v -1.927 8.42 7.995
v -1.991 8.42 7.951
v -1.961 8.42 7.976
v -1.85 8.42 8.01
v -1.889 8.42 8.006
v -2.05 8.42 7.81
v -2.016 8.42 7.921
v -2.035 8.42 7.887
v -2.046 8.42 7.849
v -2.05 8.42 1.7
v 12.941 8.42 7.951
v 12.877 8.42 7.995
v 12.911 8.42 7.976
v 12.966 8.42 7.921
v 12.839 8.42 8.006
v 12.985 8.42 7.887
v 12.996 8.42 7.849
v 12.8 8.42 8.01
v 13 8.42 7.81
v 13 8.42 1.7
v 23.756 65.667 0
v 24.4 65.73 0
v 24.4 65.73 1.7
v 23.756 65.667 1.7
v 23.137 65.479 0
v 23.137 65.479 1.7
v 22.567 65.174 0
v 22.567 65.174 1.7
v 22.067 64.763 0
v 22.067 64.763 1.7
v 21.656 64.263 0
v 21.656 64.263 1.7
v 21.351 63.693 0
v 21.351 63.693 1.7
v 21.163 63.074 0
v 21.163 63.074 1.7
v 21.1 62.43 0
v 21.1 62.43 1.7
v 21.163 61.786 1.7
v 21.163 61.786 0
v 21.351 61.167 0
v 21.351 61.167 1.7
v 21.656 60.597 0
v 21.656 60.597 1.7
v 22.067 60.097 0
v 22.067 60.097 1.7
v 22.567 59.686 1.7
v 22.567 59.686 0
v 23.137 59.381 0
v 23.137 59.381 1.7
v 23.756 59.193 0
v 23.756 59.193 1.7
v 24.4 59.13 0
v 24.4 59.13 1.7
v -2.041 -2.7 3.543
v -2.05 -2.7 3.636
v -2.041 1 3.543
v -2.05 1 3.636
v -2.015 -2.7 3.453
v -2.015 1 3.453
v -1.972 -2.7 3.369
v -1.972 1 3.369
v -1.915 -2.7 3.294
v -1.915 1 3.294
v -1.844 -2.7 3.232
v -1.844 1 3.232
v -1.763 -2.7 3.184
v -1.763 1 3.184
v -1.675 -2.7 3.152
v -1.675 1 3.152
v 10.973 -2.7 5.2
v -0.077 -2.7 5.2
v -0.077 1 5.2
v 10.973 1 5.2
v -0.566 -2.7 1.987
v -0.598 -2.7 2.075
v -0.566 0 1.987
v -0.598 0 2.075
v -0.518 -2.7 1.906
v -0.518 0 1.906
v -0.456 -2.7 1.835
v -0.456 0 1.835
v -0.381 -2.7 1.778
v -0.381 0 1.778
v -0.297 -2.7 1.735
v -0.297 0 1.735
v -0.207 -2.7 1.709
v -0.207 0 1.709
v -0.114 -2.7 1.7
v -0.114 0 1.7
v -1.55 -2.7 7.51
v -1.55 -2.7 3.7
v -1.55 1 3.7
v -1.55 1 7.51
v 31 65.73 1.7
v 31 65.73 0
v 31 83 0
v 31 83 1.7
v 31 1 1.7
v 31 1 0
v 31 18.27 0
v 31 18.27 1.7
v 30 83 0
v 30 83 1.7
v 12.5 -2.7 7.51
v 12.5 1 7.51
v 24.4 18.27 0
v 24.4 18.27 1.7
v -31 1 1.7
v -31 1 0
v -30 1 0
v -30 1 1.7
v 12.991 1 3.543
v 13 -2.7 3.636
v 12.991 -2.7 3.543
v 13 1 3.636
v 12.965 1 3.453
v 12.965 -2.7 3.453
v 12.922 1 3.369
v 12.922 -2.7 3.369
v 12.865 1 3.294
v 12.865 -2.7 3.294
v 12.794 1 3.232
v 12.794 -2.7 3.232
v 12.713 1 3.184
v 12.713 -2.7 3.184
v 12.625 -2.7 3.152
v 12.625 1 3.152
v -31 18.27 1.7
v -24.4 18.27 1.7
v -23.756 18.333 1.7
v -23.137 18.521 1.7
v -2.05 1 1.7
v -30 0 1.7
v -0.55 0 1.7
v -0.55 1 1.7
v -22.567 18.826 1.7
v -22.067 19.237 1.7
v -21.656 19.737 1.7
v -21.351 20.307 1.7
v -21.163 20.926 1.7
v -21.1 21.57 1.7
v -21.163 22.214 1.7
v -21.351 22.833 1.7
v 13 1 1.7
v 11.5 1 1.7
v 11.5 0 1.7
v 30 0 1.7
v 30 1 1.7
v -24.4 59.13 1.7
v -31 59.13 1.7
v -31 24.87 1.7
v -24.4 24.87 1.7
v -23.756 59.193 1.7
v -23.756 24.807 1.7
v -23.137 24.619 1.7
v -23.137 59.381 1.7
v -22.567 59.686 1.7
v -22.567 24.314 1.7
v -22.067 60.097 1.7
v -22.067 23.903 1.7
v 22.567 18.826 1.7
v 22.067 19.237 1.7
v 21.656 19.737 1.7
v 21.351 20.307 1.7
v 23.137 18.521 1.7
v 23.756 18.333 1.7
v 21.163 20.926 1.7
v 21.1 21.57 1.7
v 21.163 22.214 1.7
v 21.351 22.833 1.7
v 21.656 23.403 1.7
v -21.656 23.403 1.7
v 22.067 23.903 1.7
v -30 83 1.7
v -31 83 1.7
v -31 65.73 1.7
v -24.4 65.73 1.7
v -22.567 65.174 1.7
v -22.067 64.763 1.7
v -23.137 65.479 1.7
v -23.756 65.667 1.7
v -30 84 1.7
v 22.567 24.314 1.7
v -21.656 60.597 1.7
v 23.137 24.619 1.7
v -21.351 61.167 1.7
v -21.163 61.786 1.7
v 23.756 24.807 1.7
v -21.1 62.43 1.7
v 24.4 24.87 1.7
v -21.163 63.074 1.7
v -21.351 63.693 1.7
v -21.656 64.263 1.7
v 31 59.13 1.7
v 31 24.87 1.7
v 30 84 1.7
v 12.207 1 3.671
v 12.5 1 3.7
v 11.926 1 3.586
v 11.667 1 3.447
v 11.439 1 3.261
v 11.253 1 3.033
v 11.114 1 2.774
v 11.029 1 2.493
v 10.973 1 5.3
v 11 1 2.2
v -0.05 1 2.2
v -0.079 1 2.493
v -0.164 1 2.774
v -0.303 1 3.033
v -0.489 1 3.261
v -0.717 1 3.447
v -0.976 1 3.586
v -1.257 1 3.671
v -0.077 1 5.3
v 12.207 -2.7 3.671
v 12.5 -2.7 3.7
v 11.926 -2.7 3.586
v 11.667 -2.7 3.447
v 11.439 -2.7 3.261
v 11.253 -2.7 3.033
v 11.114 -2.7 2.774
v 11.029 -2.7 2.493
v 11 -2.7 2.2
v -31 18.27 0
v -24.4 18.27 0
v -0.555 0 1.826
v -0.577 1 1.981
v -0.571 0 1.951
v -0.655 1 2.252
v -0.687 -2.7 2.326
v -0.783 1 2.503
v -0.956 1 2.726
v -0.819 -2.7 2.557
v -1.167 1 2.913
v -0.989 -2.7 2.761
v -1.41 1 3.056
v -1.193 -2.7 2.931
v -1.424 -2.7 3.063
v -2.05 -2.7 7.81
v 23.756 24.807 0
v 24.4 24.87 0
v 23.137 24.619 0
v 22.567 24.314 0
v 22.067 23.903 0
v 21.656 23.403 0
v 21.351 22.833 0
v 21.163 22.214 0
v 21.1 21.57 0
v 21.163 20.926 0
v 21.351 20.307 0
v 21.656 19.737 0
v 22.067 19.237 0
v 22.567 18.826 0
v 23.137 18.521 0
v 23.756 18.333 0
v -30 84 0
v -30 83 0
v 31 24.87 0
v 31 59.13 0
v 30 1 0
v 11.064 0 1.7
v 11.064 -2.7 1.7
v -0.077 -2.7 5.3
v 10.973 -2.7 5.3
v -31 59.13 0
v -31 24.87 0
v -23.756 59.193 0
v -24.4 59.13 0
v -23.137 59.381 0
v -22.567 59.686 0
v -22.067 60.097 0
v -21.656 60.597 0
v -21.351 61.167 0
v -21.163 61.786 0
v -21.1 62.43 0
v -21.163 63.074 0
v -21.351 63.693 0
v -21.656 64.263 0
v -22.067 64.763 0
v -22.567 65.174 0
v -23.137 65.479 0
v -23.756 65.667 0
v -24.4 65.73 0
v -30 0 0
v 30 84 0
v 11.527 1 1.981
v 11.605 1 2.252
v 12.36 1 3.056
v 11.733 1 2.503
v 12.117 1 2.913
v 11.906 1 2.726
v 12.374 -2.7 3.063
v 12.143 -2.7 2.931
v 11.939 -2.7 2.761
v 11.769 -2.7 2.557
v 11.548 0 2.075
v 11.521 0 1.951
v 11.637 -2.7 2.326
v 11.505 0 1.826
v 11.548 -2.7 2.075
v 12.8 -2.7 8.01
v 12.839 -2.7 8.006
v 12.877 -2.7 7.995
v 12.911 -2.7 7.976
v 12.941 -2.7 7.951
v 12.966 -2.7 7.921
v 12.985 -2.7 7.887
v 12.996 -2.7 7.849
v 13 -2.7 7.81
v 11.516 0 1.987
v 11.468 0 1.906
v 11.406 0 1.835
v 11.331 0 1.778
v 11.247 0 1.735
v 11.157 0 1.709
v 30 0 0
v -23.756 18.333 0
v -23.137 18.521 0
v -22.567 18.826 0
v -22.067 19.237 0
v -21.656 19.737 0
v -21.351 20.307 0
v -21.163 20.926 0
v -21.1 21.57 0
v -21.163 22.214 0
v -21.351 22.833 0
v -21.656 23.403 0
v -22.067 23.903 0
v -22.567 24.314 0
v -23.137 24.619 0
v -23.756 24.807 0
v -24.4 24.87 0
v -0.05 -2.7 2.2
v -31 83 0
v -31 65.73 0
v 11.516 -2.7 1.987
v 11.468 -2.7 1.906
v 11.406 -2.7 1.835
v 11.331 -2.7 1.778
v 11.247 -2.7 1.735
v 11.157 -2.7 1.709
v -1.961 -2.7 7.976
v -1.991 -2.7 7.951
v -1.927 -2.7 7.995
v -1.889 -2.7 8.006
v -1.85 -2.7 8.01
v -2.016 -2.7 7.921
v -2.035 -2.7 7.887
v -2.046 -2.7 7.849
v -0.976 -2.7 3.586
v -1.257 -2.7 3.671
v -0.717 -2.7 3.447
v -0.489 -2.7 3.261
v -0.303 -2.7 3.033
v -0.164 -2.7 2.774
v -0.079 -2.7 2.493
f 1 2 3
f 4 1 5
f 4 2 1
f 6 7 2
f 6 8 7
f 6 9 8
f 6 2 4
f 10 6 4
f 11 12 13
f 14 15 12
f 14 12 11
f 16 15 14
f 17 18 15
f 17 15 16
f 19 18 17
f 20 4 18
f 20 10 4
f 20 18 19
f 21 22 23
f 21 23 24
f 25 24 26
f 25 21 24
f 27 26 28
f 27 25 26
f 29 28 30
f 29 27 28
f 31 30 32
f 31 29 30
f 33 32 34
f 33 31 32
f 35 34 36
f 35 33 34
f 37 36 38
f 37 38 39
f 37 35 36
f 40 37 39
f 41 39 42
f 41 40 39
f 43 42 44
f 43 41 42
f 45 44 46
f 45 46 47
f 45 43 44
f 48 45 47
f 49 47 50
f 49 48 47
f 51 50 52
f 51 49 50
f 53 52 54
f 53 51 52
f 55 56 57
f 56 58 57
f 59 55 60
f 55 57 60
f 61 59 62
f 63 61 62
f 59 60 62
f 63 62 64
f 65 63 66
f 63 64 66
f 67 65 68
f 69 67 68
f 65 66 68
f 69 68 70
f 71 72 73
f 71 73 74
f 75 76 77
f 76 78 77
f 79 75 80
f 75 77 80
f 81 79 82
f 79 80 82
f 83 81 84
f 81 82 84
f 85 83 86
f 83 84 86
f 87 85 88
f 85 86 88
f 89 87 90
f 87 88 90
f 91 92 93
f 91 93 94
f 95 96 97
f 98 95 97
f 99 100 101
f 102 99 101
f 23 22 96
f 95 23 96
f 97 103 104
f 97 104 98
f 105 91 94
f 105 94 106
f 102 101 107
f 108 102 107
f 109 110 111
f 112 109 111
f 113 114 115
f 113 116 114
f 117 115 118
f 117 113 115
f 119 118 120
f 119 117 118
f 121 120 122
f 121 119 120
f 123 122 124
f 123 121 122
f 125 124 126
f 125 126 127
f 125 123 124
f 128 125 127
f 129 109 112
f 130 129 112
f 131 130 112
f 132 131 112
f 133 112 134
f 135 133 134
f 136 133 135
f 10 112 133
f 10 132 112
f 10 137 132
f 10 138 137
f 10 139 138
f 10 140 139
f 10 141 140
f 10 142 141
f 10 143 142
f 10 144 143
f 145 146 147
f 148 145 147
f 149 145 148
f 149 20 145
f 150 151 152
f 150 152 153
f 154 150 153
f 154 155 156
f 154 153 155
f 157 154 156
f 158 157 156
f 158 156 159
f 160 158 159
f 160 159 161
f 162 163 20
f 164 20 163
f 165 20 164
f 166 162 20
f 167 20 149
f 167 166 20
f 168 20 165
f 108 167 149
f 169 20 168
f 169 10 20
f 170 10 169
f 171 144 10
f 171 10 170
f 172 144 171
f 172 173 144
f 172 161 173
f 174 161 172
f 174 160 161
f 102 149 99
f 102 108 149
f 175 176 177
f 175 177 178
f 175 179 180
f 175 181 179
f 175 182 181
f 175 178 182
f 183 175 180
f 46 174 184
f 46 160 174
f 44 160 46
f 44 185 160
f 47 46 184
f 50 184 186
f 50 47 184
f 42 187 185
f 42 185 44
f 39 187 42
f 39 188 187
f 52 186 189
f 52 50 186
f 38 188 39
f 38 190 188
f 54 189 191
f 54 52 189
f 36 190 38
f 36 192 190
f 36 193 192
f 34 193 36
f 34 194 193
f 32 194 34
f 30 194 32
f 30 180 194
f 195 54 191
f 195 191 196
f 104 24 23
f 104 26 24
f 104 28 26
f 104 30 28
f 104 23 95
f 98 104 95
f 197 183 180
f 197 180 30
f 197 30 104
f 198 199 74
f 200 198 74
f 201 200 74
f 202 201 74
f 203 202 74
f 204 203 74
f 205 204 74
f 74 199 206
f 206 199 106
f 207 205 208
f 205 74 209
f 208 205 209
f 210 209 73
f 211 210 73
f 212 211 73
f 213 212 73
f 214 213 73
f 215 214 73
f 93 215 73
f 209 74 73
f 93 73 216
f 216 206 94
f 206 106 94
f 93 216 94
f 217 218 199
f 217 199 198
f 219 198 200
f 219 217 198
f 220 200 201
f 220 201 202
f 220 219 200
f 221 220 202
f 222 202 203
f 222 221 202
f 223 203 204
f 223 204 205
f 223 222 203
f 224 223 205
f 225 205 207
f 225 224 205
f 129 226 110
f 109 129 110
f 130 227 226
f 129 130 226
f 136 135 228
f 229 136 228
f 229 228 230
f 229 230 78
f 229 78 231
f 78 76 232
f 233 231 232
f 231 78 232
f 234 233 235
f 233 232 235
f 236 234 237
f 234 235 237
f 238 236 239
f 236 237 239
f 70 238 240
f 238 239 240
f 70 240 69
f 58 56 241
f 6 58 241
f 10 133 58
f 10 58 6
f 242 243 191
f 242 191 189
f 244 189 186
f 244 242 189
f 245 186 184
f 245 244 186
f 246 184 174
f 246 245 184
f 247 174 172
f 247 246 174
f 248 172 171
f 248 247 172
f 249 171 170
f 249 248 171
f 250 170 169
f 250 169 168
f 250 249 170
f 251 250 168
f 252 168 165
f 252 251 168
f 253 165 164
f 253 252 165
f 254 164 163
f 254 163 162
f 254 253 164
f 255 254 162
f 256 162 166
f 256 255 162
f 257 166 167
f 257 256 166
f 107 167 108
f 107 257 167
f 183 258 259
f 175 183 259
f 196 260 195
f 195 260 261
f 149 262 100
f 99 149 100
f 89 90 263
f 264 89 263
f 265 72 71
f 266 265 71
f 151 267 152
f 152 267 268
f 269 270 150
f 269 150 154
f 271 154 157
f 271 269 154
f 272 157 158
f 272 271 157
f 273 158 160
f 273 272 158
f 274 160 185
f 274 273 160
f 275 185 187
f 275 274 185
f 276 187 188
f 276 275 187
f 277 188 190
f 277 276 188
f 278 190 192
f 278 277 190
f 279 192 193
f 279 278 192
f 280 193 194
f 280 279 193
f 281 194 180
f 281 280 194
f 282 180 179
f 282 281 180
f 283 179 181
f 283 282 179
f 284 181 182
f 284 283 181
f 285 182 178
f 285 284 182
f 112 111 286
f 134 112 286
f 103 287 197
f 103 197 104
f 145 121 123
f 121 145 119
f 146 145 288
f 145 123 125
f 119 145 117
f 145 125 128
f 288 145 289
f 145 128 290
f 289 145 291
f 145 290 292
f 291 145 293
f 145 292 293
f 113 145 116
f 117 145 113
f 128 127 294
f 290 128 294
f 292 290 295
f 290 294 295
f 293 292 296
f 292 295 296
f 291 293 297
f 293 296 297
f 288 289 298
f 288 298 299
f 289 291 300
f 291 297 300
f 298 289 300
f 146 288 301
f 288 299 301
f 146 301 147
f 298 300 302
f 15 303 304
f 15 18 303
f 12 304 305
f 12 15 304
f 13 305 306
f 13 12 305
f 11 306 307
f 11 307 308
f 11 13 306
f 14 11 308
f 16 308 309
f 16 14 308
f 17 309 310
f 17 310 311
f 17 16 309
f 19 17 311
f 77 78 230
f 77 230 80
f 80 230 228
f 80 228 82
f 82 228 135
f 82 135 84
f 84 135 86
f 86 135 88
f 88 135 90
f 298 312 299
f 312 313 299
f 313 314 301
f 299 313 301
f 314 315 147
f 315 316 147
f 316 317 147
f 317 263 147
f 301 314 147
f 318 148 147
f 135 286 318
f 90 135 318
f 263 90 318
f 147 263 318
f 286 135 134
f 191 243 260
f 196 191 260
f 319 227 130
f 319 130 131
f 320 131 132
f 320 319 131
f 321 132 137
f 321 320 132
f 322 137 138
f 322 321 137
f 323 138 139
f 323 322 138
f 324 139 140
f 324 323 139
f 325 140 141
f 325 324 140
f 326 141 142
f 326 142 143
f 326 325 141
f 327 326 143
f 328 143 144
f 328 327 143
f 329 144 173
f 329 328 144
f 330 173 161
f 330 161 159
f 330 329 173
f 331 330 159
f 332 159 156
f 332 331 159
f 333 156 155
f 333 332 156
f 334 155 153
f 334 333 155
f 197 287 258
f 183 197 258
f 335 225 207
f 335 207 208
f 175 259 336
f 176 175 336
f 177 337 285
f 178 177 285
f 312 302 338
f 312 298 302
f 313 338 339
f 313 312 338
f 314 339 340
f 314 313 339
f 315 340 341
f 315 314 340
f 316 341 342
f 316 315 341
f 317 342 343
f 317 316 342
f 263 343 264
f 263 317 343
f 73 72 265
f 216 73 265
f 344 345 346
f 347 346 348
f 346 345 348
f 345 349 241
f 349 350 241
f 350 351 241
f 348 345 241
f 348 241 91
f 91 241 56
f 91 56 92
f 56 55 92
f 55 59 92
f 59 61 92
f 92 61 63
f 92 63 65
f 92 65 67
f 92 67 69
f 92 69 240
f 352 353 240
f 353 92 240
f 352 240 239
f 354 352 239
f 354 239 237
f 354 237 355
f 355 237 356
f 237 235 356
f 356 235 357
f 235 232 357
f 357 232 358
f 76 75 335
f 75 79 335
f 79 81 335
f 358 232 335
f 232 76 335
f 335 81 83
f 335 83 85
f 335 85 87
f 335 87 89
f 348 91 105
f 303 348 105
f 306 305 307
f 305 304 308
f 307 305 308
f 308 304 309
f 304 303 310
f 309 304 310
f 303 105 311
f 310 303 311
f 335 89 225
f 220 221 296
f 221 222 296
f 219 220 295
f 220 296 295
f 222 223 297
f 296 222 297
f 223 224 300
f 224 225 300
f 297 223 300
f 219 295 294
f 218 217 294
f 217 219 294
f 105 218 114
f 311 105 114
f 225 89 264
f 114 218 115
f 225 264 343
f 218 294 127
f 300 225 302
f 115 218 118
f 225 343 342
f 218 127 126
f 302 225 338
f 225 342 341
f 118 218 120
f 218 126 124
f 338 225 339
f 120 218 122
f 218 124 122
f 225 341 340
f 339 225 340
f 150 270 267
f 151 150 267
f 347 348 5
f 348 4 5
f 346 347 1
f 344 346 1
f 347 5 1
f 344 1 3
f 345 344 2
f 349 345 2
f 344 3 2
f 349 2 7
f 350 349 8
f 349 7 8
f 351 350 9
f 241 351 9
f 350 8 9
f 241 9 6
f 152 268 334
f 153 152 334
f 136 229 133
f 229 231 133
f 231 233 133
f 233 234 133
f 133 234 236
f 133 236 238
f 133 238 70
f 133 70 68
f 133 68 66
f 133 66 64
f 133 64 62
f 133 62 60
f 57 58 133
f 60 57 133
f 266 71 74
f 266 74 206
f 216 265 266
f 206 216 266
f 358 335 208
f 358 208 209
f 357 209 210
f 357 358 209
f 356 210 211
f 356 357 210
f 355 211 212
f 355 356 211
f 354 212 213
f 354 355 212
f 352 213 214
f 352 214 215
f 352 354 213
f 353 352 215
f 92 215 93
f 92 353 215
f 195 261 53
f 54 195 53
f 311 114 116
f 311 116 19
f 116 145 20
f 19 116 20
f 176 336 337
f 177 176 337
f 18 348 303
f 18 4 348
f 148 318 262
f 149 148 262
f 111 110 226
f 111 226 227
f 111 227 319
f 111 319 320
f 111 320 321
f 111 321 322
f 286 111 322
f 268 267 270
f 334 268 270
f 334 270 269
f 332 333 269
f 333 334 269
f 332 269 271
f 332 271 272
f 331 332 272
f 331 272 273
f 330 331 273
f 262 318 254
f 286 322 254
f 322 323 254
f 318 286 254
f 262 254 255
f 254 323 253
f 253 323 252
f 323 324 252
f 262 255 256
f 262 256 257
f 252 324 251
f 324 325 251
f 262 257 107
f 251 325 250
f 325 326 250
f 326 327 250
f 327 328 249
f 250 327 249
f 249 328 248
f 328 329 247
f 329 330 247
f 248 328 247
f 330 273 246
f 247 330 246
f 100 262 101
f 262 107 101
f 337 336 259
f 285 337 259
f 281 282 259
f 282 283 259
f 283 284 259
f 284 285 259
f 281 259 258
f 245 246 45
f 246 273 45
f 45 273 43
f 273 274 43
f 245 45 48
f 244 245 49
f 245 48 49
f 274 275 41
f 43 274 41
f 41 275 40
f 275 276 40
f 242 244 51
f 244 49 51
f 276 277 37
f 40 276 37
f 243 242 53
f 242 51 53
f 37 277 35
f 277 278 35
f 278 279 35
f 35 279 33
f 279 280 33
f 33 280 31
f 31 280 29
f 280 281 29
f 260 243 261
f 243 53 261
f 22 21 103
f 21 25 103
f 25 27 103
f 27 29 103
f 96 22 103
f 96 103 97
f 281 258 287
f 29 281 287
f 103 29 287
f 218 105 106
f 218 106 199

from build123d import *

# Parameters (mm, degrees)
PAD_DEPTH       = 1.7
SKETCH006_W     = 15.05
SKETCH006_H     = 11.12
PAD005_DEPTH    = 6.31
SKETCH012_W     = 11.05
SKETCH012_H     = 0.1
POCKET001_DEPTH = 3.7
FILLET002_R     = 0.2
FILLET003_R     = 0.2
FILLET010_R     = 0.5


with BuildPart() as part:
    # Sketch → Pad (new body)
    with BuildSketch(Plane.XY):
        with BuildLine():
            Line((0, 0), (30, 0))
            Line((30, 0), (30, 1))
            Line((30, 1), (31, 1))
            Line((31, 1), (31, 18.27))
            Line((31, 18.27), (24.4, 18.27))
            ThreePointArc((24.4, 24.87), (21.1, 21.57), (24.4, 18.27))
            Line((24.4, 24.87), (31, 24.87))
            Line((31, 24.87), (31, 59.13))
            Line((31, 59.13), (24.4, 59.13))
            ThreePointArc((24.4, 65.73), (21.1, 62.43), (24.4, 59.13))
            Line((24.4, 65.73), (31, 65.73))
            Line((31, 65.73), (31, 83))
            Line((30, 83), (31, 83))
            Line((30, 84), (30, 83))
            Line((30, 84), (0, 84))
            Line((0, 84), (-30, 84))
            Line((-30, 84), (-30, 83))
            Line((-30, 83), (-31, 83))
            Line((-31, 83), (-31, 65.73))
            Line((-31, 65.73), (-24.4, 65.73))
            ThreePointArc((-24.4, 59.13), (-21.1, 62.43), (-24.4, 65.73))
            Line((-24.4, 59.13), (-31, 59.13))
            Line((-31, 59.13), (-31, 24.87))
            Line((-31, 24.87), (-24.4, 24.87))
            ThreePointArc((-24.4, 18.27), (-21.1, 21.57), (-24.4, 24.87))
            Line((-24.4, 18.27), (-31, 18.27))
            Line((-31, 18.27), (-31, 1))
            Line((-31, 1), (-30, 1))
            Line((-30, 1), (-30, 0))
            Line((-30, 0), (0, 0))
        make_face()
    extrude(amount=PAD_DEPTH)

    # Sketch006 → Pad005 (new body)
    with BuildSketch(Plane.XY.offset(1.7)):
        with Locations((5.475, 2.86)):
            Rectangle(SKETCH006_W, SKETCH006_H)
    extrude(amount=PAD005_DEPTH)

    # Sketch012 → Pocket001 (cut)
    with BuildSketch(Plane.XZ.offset(2.7)):
        with BuildLine():
            Line((-2.05, 1.7), (-2.05, 3.2))
            ThreePointArc((-0.55, 1.7), (-0.98934, 2.76066), (-2.05, 3.2))
            Line((-2.05, 1.7), (-0.55, 1.7))
        make_face()
        with BuildLine():
            Line((13, 3.2), (13, 1.7))
            Line((13, 1.7), (11.5, 1.7))
            ThreePointArc((13, 3.2), (11.93934, 2.76066), (11.5, 1.7))
        make_face()
        with BuildLine():
            Line((-1.55, 7.51), (12.5, 7.51))
            Line((12.5, 7.51), (12.5, 3.7))
            ThreePointArc((12.5, 3.7), (11.43934, 3.26066), (11, 2.2))
            Line((11, 2.2), (-0.05, 2.2))
            ThreePointArc((-0.05, 2.2), (-0.48934, 3.26066), (-1.55, 3.7))
            Line((-1.55, 3.7), (-1.55, 7.51))
        make_face()
        with Locations((5.44813, 5.25)):
            Rectangle(SKETCH012_W, SKETCH012_H, mode=Mode.SUBTRACT)
    extrude(amount=-POCKET001_DEPTH, mode=Mode.SUBTRACT)

    # Fillet002
    fillet002_edges = [part.edges().sort_by_distance(p)[0] for p in [
        (13, 2.86, 8.01),
    ]]
    fillet(fillet002_edges, radius=FILLET002_R)

    # Fillet003
    fillet003_edges = [part.edges().sort_by_distance(p)[0] for p in [
        (-2.05, 2.86, 8.01),
    ]]
    fillet(fillet003_edges, radius=FILLET003_R)

    # Fillet010
    fillet010_edges = [part.edges().sort_by_distance(p)[0] for p in [
        (-0.55, -1.35, 1.7),
        (-2.05, -0.85, 3.2),
        (13, -0.85, 3.2),
        (11.5, -1.35, 1.7),
    ]]
    fillet(fillet010_edges, radius=FILLET010_R)


solid = part.part
